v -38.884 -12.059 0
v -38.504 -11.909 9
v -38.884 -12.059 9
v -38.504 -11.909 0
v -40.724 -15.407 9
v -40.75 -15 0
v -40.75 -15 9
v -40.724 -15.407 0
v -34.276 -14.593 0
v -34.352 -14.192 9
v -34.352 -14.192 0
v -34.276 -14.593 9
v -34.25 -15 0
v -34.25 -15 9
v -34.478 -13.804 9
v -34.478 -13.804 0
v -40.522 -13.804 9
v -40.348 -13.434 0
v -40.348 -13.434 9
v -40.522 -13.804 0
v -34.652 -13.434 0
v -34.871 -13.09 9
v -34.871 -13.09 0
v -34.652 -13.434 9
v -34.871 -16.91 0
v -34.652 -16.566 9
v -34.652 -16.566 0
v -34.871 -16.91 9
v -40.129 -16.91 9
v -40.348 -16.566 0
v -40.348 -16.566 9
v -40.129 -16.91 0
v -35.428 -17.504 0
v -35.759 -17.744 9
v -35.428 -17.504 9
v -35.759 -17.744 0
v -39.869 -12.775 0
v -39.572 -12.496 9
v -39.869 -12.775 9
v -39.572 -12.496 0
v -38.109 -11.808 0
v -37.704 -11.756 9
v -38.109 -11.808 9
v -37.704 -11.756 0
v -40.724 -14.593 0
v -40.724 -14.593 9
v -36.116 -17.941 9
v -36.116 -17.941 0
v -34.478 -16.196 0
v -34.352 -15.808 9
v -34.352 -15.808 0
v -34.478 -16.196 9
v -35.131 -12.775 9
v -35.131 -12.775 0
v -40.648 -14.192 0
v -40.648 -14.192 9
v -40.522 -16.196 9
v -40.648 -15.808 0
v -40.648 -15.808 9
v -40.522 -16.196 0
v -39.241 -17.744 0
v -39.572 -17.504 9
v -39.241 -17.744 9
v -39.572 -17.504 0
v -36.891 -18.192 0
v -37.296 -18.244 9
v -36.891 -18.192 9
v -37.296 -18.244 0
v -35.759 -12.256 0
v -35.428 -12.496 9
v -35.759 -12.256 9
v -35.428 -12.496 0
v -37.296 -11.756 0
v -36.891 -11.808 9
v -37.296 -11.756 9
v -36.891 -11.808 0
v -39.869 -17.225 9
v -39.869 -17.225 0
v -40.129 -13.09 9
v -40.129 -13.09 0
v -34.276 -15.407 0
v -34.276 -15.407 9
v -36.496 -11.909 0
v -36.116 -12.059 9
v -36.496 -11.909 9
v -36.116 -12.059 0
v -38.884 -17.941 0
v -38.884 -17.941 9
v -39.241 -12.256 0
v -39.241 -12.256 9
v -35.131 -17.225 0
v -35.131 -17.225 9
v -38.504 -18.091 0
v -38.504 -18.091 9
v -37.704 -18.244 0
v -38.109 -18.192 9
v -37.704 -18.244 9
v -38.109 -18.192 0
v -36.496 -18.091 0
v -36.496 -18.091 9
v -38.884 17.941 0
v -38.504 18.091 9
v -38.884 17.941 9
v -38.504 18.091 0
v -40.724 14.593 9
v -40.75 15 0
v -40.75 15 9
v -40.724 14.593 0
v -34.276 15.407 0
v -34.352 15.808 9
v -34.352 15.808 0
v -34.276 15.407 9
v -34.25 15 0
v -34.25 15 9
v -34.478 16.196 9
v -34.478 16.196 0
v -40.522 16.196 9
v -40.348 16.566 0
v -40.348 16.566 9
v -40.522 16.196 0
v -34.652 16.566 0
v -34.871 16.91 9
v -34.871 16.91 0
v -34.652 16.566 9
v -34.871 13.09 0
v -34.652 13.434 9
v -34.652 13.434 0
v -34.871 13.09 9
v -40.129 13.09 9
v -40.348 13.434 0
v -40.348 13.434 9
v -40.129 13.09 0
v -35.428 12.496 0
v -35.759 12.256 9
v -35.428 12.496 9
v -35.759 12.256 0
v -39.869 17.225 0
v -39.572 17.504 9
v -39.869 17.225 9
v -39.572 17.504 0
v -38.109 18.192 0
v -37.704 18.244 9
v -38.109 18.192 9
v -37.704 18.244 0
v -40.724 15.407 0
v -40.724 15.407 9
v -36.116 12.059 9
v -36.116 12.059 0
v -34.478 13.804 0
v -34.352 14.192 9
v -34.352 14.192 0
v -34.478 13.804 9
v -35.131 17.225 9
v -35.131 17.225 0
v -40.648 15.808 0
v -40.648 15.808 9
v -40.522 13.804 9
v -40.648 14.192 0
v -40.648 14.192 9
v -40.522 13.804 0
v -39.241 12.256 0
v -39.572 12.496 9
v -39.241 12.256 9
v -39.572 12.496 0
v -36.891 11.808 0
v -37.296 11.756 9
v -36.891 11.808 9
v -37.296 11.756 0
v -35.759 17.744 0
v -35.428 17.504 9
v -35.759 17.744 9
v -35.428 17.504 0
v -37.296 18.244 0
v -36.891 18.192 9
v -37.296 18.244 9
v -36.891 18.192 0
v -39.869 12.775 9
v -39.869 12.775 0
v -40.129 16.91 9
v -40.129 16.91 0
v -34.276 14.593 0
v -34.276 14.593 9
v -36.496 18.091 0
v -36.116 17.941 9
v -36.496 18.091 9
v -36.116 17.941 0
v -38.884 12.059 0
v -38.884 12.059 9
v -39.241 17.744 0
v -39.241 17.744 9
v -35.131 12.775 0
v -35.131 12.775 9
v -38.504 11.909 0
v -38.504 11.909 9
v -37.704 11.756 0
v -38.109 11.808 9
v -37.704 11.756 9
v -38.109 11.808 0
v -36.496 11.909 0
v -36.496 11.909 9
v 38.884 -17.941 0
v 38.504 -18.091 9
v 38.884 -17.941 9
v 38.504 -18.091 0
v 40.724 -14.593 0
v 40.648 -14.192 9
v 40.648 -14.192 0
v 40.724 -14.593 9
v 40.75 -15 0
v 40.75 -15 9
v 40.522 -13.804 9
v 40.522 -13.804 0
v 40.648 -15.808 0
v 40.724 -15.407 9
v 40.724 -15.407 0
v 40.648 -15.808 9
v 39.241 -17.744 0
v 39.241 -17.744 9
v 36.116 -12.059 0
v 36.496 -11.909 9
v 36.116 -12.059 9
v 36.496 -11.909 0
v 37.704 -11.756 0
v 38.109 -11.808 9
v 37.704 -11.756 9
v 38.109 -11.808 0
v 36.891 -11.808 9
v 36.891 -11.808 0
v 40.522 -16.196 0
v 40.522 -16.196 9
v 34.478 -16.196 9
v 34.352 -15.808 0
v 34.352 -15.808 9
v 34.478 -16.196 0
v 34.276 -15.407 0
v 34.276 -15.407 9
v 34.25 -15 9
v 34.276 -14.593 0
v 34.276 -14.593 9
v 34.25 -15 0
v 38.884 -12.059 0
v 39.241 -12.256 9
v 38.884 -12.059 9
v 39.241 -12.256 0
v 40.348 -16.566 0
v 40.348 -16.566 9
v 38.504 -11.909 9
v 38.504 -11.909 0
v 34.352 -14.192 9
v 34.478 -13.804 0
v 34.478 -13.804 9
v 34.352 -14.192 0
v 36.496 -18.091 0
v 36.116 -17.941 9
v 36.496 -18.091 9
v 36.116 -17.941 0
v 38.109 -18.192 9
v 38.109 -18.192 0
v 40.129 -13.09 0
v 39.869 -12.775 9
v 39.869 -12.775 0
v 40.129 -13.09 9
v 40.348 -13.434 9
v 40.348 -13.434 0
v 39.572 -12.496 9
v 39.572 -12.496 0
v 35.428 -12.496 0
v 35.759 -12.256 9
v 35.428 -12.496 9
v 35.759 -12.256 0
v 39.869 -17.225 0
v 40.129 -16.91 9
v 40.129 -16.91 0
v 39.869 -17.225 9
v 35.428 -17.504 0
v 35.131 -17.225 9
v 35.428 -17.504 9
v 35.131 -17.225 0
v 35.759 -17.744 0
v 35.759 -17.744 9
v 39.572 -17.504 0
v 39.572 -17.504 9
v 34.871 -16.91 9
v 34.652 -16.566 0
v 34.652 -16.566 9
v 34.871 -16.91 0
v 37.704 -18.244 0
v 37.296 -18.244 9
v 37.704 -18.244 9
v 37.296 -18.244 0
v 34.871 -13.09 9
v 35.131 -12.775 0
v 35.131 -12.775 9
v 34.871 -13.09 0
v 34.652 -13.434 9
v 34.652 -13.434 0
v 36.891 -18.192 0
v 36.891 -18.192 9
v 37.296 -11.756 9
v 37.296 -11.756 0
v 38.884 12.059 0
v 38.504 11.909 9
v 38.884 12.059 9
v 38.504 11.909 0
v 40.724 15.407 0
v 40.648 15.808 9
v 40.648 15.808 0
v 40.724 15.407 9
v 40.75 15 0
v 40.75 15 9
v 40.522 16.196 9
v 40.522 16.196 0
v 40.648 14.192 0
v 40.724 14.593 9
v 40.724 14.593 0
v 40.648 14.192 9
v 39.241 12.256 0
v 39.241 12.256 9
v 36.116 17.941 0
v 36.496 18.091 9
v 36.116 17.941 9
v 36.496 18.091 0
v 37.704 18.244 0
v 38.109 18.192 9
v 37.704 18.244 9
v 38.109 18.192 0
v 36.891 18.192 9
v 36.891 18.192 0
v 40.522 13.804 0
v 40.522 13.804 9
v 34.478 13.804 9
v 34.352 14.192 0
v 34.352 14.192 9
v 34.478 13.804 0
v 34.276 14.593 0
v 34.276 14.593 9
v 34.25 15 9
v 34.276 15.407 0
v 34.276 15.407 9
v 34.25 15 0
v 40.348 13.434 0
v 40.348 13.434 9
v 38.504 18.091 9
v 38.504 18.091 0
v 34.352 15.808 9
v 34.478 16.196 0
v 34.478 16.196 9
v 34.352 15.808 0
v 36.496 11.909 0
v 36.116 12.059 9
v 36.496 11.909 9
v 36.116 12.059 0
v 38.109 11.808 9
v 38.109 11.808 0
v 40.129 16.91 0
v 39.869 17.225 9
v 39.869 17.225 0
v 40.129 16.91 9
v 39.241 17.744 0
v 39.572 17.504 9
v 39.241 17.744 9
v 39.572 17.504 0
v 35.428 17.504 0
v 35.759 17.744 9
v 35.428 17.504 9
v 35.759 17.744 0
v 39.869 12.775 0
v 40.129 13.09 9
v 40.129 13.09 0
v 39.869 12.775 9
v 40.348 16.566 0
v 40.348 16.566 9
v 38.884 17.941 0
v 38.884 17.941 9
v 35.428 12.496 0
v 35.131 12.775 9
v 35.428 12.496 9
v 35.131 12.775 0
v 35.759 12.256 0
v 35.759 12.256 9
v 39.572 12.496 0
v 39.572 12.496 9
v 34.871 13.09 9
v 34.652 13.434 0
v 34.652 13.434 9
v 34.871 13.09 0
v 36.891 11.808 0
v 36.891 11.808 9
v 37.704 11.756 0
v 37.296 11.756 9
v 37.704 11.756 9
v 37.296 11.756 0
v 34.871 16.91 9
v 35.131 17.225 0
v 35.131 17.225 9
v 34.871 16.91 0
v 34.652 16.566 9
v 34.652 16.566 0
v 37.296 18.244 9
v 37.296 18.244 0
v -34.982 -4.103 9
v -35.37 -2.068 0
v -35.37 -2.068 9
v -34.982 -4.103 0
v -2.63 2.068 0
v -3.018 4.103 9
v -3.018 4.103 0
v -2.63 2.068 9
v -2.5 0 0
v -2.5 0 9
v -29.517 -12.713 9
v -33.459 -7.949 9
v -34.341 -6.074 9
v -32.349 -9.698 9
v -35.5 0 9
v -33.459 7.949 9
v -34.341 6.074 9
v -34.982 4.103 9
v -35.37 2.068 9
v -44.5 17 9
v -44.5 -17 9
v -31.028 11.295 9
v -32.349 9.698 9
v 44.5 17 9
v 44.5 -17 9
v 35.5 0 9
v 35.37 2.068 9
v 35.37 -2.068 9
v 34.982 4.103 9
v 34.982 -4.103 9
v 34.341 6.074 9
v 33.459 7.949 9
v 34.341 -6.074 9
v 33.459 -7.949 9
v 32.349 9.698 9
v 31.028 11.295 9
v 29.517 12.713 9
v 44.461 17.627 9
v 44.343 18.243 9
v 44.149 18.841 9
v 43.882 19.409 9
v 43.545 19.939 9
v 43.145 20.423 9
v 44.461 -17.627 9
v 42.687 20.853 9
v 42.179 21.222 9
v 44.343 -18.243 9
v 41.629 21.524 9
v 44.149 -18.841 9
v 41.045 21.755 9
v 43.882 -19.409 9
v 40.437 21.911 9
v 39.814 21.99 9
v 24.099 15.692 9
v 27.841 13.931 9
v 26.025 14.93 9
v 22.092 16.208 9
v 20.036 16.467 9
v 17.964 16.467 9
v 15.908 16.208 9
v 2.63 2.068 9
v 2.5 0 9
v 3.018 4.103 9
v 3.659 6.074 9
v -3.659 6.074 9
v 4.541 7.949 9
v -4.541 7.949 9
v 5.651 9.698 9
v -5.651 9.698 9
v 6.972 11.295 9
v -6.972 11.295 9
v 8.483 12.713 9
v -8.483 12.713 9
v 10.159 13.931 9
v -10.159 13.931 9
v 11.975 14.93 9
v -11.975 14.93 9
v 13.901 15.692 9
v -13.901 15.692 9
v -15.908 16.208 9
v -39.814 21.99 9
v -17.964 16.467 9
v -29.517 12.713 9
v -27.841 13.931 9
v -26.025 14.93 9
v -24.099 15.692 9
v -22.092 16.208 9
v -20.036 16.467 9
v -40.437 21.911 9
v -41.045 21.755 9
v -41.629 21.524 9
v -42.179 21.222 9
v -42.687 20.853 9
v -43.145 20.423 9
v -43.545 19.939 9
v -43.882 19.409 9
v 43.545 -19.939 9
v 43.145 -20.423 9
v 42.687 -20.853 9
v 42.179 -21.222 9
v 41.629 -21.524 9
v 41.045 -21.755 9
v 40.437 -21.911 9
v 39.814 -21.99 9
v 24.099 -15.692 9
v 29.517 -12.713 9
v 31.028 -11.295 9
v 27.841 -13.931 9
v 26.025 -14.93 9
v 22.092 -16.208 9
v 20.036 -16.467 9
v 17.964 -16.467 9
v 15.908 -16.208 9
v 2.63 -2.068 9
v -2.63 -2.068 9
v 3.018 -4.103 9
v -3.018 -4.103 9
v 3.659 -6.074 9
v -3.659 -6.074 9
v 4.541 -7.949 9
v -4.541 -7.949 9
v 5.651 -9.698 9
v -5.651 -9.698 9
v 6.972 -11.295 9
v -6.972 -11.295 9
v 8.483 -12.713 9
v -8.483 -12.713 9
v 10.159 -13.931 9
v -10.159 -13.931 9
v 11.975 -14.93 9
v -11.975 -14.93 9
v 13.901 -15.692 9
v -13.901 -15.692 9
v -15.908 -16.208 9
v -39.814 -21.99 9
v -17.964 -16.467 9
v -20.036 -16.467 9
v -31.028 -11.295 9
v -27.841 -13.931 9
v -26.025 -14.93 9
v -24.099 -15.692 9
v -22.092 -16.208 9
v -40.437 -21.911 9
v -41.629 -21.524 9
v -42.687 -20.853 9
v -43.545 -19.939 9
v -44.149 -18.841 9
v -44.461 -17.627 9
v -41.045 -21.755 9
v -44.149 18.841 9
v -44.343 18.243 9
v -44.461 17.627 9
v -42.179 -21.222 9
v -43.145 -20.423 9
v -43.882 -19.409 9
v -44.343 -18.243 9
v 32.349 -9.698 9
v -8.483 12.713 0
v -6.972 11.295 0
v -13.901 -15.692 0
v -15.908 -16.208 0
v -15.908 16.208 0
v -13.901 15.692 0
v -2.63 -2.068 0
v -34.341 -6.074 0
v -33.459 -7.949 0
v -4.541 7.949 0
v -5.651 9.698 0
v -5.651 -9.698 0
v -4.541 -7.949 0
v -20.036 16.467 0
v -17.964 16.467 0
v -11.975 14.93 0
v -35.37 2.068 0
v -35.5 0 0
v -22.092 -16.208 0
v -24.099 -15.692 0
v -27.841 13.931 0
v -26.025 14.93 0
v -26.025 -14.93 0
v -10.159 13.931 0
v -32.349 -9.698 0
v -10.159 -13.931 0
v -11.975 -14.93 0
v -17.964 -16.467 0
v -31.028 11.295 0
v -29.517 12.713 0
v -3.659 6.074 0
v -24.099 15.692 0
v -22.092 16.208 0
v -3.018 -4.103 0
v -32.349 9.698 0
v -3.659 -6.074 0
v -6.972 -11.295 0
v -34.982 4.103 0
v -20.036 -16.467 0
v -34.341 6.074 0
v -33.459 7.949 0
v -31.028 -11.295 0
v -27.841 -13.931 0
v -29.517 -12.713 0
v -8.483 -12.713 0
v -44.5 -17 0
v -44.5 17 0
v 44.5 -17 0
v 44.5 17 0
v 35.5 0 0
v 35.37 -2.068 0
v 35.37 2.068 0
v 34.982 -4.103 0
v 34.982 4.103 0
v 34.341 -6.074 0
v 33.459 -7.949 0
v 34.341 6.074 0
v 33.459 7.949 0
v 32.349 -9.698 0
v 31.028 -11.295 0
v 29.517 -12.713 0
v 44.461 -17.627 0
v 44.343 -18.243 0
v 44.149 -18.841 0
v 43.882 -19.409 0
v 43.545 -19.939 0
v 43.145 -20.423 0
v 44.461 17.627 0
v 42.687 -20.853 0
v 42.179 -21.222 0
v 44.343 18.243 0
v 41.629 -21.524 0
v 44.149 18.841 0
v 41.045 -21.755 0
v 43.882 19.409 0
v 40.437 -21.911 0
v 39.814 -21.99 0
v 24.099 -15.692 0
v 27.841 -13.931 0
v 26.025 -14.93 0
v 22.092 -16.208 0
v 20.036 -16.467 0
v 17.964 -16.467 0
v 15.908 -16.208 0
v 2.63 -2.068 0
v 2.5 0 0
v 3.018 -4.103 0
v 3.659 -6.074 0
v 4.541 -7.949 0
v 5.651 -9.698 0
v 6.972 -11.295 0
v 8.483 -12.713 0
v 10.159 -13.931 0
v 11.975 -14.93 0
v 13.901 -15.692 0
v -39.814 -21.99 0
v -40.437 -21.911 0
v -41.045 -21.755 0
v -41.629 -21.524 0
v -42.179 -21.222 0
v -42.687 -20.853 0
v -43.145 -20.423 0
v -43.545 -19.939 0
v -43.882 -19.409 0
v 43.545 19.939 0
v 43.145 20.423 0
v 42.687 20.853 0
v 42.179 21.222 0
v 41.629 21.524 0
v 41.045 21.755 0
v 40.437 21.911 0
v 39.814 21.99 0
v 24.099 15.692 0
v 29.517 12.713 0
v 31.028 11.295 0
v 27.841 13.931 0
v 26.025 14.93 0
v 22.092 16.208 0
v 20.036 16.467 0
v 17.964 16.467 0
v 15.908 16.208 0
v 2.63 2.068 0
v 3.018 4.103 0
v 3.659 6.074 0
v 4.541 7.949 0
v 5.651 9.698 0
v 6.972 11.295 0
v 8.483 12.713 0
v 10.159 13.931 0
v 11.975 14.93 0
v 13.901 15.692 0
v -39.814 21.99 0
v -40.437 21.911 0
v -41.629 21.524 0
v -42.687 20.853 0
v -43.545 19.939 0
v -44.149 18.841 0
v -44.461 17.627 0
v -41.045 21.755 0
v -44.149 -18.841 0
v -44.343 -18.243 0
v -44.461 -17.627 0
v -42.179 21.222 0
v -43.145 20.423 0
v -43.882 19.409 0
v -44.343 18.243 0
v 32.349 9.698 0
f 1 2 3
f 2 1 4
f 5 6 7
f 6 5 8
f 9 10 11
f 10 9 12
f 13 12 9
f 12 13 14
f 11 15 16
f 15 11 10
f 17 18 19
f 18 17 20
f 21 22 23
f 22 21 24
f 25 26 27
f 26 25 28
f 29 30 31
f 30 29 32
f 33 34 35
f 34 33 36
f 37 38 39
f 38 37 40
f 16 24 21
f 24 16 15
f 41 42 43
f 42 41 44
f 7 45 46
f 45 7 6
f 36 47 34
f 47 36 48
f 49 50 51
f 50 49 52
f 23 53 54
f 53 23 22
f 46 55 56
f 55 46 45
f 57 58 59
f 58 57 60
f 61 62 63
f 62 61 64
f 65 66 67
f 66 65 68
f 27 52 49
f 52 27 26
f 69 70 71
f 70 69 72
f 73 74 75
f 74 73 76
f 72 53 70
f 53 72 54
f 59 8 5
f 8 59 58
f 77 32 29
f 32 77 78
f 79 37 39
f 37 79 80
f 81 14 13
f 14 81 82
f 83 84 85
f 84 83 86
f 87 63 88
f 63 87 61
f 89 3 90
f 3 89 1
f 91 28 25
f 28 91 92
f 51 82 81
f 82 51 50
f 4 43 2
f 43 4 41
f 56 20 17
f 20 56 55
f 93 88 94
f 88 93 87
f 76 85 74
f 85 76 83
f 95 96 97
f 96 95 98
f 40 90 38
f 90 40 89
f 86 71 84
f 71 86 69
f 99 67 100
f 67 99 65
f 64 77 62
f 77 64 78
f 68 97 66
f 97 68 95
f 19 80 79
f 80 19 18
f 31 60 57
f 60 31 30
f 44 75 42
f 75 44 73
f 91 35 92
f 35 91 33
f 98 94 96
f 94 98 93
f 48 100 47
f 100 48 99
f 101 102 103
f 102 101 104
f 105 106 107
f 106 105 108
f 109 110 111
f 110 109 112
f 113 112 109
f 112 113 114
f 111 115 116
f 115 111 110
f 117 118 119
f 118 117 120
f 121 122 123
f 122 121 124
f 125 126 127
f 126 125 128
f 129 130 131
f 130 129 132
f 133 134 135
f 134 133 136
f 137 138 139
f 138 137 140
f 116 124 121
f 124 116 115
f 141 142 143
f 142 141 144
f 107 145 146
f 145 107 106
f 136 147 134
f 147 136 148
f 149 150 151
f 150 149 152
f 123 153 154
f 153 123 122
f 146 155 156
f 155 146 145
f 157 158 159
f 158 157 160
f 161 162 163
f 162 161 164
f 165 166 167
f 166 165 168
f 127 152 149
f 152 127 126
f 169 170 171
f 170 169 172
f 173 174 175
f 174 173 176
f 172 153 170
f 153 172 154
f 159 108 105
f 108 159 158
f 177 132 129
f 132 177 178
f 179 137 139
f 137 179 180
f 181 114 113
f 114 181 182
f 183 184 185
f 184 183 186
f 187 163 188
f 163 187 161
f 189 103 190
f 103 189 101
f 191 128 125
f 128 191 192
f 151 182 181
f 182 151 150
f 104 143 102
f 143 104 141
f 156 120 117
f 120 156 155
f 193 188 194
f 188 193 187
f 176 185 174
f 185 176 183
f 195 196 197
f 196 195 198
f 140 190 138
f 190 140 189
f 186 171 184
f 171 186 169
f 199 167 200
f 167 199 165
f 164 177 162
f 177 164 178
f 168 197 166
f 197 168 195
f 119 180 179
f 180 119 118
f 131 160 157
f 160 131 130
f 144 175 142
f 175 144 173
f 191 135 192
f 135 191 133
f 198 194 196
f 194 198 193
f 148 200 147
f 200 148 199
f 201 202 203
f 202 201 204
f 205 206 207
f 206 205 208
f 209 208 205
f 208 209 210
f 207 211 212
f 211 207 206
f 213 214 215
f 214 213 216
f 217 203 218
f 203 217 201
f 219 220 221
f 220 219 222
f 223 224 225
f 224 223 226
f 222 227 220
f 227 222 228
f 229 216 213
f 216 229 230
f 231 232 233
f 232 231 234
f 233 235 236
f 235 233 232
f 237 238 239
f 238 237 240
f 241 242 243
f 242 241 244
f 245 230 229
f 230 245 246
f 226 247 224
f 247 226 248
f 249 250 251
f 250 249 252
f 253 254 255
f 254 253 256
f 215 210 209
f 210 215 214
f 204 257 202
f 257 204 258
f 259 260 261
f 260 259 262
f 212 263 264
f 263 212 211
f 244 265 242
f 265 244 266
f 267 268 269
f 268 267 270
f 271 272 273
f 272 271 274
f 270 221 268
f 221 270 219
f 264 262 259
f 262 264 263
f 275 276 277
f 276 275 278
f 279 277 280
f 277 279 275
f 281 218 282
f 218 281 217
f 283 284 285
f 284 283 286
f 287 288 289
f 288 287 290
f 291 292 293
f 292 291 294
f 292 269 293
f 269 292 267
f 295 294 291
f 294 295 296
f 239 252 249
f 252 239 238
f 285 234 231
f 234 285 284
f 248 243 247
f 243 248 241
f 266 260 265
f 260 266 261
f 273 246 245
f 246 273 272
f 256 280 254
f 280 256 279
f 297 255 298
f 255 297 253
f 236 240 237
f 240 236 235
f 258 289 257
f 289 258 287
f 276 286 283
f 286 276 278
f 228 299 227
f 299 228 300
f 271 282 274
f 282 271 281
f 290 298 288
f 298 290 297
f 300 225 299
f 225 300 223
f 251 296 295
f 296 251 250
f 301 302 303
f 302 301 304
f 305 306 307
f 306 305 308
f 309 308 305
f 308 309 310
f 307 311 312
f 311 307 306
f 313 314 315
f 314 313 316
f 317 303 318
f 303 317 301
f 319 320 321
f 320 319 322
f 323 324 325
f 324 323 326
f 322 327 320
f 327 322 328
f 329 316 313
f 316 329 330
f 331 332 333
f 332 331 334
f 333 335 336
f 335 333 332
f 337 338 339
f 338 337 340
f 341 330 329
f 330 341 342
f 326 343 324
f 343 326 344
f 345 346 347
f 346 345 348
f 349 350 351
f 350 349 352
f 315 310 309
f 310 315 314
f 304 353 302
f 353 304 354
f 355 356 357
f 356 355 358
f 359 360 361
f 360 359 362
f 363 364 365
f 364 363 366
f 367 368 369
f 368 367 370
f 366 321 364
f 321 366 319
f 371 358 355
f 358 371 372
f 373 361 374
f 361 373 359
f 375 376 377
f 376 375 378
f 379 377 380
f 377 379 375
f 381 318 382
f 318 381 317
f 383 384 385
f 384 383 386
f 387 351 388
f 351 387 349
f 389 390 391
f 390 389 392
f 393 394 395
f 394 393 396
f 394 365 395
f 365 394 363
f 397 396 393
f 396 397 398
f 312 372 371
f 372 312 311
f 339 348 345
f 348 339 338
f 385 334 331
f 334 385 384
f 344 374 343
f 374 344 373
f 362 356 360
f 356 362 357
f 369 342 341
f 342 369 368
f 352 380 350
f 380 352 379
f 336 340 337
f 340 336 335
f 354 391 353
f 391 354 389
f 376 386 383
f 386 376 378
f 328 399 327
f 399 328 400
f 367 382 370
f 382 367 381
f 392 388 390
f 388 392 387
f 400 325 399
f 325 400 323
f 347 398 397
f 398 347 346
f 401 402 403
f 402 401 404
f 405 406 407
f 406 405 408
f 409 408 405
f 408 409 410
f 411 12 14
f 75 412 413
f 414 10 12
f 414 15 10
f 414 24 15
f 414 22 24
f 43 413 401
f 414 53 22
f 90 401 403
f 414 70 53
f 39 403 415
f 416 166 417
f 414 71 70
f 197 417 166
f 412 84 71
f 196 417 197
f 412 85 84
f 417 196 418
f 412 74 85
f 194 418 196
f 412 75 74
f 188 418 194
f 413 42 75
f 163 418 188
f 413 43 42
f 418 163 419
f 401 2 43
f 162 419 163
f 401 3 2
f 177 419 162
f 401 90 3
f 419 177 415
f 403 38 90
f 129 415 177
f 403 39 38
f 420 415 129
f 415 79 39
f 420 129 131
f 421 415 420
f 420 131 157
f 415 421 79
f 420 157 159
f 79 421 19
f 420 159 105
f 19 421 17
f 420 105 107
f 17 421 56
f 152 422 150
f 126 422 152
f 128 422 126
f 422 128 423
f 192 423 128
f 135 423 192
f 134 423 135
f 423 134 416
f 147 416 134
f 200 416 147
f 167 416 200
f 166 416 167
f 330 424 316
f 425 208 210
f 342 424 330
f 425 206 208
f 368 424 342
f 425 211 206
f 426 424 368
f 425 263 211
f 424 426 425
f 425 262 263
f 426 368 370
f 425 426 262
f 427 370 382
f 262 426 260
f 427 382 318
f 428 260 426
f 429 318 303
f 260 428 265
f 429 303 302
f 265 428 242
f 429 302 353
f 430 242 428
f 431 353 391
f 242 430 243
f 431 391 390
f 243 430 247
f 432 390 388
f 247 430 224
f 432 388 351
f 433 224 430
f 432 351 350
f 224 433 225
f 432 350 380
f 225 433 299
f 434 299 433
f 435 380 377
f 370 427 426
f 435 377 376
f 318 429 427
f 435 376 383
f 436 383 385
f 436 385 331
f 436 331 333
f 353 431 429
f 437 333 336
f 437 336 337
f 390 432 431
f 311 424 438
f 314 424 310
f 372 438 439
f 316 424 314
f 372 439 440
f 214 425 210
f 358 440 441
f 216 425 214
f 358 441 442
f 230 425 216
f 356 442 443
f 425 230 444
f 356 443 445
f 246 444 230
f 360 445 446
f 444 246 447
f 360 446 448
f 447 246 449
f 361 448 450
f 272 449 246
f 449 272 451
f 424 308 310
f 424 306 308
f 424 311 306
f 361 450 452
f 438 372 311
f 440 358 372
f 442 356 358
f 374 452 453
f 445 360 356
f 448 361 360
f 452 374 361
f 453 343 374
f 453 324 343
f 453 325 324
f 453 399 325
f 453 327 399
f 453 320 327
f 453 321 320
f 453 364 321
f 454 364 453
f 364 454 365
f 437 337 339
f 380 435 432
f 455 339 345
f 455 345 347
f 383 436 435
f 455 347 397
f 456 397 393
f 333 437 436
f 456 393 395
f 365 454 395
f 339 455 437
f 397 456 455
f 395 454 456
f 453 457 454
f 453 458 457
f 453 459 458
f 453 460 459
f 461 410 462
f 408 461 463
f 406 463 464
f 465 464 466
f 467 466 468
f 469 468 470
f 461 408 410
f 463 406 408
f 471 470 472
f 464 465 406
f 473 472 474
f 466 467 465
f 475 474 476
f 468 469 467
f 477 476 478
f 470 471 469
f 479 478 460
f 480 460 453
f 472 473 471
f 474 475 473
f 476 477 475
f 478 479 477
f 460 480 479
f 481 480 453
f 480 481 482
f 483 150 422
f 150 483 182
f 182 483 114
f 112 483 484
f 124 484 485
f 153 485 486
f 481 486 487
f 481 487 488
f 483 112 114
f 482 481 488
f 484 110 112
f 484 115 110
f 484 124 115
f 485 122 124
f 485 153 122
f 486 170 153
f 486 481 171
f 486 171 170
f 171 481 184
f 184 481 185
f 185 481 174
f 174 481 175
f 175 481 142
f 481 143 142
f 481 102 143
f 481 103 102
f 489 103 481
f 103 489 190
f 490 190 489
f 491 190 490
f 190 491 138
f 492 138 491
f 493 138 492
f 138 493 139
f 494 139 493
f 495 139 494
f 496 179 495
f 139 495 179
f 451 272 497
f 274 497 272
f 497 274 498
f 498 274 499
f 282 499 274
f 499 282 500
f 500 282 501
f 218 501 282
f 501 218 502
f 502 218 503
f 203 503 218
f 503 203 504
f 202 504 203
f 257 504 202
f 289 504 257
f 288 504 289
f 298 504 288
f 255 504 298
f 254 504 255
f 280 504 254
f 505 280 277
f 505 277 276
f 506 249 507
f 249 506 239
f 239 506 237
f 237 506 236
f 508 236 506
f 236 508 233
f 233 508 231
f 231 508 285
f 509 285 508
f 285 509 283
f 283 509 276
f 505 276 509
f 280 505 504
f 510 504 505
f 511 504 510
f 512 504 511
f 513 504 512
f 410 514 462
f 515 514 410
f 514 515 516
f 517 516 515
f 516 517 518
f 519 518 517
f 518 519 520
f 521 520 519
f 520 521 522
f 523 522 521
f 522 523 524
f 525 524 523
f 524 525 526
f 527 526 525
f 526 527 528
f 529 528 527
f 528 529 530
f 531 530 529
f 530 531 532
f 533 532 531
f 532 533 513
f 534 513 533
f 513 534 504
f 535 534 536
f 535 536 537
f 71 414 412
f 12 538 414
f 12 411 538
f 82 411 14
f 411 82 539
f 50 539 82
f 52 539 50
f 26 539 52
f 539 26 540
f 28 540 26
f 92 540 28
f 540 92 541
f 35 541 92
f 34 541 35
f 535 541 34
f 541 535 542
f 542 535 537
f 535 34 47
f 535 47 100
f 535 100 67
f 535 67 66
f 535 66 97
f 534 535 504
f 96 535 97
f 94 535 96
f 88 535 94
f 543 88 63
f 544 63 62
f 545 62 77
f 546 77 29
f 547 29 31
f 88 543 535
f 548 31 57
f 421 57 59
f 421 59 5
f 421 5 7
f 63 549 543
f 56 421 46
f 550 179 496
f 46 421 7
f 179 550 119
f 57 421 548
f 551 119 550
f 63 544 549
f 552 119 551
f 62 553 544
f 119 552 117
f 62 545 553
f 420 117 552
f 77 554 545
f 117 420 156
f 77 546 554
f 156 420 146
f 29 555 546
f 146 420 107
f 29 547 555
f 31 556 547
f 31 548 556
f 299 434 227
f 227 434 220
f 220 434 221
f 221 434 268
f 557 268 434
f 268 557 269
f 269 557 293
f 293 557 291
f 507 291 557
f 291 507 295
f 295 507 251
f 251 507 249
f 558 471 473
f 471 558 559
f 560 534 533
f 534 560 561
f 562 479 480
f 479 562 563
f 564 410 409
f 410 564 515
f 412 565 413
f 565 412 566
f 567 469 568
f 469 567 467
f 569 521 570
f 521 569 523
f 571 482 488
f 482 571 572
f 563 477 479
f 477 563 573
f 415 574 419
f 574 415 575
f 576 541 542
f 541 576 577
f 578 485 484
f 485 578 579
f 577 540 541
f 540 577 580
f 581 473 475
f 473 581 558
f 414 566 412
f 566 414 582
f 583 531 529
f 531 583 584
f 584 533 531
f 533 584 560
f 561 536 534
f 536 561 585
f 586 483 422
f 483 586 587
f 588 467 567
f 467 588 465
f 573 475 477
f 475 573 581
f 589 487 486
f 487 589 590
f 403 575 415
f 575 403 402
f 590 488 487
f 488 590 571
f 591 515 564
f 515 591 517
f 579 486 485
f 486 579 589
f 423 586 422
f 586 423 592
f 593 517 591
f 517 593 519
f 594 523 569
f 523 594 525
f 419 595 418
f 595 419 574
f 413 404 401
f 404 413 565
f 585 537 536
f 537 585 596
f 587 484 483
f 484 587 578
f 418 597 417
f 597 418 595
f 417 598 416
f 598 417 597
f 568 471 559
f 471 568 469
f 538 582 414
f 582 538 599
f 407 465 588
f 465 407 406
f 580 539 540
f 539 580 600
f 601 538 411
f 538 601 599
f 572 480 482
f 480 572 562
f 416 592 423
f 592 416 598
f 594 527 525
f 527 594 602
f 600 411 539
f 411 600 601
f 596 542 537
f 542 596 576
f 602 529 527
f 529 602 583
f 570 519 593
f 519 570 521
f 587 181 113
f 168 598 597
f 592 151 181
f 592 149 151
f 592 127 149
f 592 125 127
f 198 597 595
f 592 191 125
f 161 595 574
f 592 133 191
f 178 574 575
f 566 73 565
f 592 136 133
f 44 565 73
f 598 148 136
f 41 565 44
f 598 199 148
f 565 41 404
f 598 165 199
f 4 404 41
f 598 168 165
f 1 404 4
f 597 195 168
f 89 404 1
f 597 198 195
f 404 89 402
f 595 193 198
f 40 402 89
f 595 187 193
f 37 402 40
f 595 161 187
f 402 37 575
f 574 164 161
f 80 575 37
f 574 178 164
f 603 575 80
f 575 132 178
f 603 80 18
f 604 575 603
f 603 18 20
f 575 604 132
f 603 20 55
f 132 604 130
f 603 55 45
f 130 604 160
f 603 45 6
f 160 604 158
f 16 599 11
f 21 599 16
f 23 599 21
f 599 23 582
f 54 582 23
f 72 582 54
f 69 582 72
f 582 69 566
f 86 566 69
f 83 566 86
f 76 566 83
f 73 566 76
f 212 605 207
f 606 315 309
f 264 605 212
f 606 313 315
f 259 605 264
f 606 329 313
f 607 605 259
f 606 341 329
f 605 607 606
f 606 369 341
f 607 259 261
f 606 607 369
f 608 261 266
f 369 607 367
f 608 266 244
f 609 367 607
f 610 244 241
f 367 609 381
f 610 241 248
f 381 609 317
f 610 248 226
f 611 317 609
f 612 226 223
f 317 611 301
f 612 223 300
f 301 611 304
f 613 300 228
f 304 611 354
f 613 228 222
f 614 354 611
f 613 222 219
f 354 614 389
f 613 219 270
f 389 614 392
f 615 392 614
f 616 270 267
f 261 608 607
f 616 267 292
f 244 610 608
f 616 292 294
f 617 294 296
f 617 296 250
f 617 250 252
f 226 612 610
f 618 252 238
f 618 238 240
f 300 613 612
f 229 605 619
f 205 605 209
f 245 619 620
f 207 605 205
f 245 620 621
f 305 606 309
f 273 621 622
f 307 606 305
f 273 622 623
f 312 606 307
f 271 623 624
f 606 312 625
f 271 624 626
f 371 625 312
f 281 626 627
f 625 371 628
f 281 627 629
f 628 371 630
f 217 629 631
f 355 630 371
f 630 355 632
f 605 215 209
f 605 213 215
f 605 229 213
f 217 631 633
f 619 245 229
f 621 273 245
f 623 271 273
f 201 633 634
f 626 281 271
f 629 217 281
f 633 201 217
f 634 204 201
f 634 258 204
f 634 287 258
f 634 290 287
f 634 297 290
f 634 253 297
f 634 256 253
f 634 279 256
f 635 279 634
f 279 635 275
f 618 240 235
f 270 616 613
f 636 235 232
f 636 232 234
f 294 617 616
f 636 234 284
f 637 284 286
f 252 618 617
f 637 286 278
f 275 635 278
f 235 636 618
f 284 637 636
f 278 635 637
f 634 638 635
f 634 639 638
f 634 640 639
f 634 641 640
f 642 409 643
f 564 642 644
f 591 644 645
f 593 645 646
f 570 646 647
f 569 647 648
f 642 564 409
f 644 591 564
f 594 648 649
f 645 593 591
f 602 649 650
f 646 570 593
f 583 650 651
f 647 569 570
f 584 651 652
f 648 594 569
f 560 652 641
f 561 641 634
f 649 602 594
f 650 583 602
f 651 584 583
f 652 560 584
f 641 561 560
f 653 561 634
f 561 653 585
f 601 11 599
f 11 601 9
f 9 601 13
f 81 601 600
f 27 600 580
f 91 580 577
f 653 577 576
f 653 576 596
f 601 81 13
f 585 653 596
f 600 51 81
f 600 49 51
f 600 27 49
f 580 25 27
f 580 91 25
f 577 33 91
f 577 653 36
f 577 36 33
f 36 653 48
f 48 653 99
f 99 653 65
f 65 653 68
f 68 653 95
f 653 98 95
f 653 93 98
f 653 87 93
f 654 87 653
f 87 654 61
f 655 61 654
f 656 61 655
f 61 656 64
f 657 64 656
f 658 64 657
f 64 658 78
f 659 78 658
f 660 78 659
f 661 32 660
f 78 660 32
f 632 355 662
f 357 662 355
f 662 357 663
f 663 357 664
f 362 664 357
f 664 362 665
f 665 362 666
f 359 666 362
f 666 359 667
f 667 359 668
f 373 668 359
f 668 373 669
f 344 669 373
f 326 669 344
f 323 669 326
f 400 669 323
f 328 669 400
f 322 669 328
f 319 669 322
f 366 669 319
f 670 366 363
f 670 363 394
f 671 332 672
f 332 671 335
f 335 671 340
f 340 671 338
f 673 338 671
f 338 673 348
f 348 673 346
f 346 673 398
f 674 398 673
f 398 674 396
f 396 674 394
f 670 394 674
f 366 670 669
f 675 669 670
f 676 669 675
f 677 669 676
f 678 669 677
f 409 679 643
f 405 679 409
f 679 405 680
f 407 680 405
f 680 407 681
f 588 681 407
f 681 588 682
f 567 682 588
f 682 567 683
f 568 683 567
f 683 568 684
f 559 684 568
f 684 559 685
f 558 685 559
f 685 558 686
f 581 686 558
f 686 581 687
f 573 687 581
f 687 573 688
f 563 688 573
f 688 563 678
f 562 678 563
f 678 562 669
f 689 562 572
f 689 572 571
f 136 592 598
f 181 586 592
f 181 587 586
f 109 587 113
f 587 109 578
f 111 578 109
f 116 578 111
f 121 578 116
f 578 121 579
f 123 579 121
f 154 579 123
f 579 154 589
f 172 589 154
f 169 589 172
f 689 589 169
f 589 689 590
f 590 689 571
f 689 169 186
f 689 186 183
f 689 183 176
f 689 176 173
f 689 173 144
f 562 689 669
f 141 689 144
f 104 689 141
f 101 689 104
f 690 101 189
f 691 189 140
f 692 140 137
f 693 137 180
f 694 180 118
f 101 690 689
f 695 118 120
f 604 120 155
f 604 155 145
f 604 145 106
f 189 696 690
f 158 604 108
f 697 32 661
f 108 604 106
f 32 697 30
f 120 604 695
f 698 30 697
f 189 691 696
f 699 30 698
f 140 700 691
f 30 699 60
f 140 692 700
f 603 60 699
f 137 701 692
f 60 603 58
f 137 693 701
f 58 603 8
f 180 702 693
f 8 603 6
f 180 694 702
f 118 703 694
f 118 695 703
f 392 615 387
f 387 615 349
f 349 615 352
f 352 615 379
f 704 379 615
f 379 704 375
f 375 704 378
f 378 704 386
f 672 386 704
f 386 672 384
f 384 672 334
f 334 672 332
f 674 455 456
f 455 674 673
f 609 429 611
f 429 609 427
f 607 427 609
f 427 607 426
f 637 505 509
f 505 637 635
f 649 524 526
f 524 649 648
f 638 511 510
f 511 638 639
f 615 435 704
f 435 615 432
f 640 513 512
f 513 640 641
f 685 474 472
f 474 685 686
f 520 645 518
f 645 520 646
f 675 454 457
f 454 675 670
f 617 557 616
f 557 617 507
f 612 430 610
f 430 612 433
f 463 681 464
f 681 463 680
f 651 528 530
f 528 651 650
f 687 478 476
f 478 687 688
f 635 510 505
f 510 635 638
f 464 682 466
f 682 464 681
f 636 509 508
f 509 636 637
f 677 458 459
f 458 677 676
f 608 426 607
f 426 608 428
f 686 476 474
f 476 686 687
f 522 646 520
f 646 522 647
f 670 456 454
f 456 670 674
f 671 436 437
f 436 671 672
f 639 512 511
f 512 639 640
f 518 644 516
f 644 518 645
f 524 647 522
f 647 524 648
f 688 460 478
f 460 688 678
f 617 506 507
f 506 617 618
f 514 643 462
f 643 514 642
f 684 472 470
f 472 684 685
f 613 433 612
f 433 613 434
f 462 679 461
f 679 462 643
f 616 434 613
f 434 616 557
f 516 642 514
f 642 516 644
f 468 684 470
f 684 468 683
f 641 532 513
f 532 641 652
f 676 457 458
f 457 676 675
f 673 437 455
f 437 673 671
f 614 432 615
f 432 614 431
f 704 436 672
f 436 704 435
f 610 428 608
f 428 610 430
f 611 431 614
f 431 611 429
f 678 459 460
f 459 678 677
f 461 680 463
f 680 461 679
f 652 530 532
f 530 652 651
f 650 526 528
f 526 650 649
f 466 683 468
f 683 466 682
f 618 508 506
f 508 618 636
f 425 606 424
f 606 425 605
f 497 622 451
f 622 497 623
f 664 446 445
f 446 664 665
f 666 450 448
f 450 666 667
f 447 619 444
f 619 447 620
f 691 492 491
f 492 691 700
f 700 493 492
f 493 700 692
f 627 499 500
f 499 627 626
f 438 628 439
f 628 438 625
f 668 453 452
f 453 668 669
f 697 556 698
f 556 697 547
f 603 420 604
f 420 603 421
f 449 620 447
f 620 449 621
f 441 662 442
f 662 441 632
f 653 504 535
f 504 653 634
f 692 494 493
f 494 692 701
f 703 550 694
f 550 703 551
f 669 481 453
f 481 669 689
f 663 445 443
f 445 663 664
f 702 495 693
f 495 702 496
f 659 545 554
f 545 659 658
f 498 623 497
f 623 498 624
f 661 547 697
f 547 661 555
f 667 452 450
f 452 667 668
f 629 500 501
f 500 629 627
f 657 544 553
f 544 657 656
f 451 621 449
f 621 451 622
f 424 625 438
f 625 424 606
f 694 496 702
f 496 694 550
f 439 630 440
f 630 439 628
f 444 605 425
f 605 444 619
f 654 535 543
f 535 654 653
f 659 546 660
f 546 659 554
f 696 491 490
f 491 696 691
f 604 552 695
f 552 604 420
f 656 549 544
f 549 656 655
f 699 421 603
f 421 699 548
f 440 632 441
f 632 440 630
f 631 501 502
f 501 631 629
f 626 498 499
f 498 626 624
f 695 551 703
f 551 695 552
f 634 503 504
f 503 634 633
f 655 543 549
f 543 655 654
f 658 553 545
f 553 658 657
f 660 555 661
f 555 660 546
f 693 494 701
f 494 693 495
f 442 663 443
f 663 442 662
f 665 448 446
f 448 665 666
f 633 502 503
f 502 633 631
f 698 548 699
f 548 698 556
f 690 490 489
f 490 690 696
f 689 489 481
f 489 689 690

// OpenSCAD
$fn = 50;


difference() {
	union() {
		hull() {
			translate(v = [-39.5000000000, 17.0000000000, 0]) {
				cylinder(h = 9, r = 5);
			}
			translate(v = [39.5000000000, 17.0000000000, 0]) {
				cylinder(h = 9, r = 5);
			}
			translate(v = [-39.5000000000, -17.0000000000, 0]) {
				cylinder(h = 9, r = 5);
			}
			translate(v = [39.5000000000, -17.0000000000, 0]) {
				cylinder(h = 9, r = 5);
			}
		}
	}
	union() {
		#translate(v = [-37.5000000000, -15.0000000000, -100.0000000000]) {
			cylinder(h = 200, r = 3.2500000000);
		}
		#translate(v = [-37.5000000000, 15.0000000000, -100.0000000000]) {
			cylinder(h = 200, r = 3.2500000000);
		}
		#translate(v = [37.5000000000, -15.0000000000, -100.0000000000]) {
			cylinder(h = 200, r = 3.2500000000);
		}
		#translate(v = [37.5000000000, 15.0000000000, -100.0000000000]) {
			cylinder(h = 200, r = 3.2500000000);
		}
		#translate(v = [-19.0000000000, 0, 0]) {
			cylinder(h = 9, r = 16.5000000000);
		}
		#translate(v = [19.0000000000, 0, 0]) {
			cylinder(h = 9, r = 16.5000000000);
		}
	}
}
